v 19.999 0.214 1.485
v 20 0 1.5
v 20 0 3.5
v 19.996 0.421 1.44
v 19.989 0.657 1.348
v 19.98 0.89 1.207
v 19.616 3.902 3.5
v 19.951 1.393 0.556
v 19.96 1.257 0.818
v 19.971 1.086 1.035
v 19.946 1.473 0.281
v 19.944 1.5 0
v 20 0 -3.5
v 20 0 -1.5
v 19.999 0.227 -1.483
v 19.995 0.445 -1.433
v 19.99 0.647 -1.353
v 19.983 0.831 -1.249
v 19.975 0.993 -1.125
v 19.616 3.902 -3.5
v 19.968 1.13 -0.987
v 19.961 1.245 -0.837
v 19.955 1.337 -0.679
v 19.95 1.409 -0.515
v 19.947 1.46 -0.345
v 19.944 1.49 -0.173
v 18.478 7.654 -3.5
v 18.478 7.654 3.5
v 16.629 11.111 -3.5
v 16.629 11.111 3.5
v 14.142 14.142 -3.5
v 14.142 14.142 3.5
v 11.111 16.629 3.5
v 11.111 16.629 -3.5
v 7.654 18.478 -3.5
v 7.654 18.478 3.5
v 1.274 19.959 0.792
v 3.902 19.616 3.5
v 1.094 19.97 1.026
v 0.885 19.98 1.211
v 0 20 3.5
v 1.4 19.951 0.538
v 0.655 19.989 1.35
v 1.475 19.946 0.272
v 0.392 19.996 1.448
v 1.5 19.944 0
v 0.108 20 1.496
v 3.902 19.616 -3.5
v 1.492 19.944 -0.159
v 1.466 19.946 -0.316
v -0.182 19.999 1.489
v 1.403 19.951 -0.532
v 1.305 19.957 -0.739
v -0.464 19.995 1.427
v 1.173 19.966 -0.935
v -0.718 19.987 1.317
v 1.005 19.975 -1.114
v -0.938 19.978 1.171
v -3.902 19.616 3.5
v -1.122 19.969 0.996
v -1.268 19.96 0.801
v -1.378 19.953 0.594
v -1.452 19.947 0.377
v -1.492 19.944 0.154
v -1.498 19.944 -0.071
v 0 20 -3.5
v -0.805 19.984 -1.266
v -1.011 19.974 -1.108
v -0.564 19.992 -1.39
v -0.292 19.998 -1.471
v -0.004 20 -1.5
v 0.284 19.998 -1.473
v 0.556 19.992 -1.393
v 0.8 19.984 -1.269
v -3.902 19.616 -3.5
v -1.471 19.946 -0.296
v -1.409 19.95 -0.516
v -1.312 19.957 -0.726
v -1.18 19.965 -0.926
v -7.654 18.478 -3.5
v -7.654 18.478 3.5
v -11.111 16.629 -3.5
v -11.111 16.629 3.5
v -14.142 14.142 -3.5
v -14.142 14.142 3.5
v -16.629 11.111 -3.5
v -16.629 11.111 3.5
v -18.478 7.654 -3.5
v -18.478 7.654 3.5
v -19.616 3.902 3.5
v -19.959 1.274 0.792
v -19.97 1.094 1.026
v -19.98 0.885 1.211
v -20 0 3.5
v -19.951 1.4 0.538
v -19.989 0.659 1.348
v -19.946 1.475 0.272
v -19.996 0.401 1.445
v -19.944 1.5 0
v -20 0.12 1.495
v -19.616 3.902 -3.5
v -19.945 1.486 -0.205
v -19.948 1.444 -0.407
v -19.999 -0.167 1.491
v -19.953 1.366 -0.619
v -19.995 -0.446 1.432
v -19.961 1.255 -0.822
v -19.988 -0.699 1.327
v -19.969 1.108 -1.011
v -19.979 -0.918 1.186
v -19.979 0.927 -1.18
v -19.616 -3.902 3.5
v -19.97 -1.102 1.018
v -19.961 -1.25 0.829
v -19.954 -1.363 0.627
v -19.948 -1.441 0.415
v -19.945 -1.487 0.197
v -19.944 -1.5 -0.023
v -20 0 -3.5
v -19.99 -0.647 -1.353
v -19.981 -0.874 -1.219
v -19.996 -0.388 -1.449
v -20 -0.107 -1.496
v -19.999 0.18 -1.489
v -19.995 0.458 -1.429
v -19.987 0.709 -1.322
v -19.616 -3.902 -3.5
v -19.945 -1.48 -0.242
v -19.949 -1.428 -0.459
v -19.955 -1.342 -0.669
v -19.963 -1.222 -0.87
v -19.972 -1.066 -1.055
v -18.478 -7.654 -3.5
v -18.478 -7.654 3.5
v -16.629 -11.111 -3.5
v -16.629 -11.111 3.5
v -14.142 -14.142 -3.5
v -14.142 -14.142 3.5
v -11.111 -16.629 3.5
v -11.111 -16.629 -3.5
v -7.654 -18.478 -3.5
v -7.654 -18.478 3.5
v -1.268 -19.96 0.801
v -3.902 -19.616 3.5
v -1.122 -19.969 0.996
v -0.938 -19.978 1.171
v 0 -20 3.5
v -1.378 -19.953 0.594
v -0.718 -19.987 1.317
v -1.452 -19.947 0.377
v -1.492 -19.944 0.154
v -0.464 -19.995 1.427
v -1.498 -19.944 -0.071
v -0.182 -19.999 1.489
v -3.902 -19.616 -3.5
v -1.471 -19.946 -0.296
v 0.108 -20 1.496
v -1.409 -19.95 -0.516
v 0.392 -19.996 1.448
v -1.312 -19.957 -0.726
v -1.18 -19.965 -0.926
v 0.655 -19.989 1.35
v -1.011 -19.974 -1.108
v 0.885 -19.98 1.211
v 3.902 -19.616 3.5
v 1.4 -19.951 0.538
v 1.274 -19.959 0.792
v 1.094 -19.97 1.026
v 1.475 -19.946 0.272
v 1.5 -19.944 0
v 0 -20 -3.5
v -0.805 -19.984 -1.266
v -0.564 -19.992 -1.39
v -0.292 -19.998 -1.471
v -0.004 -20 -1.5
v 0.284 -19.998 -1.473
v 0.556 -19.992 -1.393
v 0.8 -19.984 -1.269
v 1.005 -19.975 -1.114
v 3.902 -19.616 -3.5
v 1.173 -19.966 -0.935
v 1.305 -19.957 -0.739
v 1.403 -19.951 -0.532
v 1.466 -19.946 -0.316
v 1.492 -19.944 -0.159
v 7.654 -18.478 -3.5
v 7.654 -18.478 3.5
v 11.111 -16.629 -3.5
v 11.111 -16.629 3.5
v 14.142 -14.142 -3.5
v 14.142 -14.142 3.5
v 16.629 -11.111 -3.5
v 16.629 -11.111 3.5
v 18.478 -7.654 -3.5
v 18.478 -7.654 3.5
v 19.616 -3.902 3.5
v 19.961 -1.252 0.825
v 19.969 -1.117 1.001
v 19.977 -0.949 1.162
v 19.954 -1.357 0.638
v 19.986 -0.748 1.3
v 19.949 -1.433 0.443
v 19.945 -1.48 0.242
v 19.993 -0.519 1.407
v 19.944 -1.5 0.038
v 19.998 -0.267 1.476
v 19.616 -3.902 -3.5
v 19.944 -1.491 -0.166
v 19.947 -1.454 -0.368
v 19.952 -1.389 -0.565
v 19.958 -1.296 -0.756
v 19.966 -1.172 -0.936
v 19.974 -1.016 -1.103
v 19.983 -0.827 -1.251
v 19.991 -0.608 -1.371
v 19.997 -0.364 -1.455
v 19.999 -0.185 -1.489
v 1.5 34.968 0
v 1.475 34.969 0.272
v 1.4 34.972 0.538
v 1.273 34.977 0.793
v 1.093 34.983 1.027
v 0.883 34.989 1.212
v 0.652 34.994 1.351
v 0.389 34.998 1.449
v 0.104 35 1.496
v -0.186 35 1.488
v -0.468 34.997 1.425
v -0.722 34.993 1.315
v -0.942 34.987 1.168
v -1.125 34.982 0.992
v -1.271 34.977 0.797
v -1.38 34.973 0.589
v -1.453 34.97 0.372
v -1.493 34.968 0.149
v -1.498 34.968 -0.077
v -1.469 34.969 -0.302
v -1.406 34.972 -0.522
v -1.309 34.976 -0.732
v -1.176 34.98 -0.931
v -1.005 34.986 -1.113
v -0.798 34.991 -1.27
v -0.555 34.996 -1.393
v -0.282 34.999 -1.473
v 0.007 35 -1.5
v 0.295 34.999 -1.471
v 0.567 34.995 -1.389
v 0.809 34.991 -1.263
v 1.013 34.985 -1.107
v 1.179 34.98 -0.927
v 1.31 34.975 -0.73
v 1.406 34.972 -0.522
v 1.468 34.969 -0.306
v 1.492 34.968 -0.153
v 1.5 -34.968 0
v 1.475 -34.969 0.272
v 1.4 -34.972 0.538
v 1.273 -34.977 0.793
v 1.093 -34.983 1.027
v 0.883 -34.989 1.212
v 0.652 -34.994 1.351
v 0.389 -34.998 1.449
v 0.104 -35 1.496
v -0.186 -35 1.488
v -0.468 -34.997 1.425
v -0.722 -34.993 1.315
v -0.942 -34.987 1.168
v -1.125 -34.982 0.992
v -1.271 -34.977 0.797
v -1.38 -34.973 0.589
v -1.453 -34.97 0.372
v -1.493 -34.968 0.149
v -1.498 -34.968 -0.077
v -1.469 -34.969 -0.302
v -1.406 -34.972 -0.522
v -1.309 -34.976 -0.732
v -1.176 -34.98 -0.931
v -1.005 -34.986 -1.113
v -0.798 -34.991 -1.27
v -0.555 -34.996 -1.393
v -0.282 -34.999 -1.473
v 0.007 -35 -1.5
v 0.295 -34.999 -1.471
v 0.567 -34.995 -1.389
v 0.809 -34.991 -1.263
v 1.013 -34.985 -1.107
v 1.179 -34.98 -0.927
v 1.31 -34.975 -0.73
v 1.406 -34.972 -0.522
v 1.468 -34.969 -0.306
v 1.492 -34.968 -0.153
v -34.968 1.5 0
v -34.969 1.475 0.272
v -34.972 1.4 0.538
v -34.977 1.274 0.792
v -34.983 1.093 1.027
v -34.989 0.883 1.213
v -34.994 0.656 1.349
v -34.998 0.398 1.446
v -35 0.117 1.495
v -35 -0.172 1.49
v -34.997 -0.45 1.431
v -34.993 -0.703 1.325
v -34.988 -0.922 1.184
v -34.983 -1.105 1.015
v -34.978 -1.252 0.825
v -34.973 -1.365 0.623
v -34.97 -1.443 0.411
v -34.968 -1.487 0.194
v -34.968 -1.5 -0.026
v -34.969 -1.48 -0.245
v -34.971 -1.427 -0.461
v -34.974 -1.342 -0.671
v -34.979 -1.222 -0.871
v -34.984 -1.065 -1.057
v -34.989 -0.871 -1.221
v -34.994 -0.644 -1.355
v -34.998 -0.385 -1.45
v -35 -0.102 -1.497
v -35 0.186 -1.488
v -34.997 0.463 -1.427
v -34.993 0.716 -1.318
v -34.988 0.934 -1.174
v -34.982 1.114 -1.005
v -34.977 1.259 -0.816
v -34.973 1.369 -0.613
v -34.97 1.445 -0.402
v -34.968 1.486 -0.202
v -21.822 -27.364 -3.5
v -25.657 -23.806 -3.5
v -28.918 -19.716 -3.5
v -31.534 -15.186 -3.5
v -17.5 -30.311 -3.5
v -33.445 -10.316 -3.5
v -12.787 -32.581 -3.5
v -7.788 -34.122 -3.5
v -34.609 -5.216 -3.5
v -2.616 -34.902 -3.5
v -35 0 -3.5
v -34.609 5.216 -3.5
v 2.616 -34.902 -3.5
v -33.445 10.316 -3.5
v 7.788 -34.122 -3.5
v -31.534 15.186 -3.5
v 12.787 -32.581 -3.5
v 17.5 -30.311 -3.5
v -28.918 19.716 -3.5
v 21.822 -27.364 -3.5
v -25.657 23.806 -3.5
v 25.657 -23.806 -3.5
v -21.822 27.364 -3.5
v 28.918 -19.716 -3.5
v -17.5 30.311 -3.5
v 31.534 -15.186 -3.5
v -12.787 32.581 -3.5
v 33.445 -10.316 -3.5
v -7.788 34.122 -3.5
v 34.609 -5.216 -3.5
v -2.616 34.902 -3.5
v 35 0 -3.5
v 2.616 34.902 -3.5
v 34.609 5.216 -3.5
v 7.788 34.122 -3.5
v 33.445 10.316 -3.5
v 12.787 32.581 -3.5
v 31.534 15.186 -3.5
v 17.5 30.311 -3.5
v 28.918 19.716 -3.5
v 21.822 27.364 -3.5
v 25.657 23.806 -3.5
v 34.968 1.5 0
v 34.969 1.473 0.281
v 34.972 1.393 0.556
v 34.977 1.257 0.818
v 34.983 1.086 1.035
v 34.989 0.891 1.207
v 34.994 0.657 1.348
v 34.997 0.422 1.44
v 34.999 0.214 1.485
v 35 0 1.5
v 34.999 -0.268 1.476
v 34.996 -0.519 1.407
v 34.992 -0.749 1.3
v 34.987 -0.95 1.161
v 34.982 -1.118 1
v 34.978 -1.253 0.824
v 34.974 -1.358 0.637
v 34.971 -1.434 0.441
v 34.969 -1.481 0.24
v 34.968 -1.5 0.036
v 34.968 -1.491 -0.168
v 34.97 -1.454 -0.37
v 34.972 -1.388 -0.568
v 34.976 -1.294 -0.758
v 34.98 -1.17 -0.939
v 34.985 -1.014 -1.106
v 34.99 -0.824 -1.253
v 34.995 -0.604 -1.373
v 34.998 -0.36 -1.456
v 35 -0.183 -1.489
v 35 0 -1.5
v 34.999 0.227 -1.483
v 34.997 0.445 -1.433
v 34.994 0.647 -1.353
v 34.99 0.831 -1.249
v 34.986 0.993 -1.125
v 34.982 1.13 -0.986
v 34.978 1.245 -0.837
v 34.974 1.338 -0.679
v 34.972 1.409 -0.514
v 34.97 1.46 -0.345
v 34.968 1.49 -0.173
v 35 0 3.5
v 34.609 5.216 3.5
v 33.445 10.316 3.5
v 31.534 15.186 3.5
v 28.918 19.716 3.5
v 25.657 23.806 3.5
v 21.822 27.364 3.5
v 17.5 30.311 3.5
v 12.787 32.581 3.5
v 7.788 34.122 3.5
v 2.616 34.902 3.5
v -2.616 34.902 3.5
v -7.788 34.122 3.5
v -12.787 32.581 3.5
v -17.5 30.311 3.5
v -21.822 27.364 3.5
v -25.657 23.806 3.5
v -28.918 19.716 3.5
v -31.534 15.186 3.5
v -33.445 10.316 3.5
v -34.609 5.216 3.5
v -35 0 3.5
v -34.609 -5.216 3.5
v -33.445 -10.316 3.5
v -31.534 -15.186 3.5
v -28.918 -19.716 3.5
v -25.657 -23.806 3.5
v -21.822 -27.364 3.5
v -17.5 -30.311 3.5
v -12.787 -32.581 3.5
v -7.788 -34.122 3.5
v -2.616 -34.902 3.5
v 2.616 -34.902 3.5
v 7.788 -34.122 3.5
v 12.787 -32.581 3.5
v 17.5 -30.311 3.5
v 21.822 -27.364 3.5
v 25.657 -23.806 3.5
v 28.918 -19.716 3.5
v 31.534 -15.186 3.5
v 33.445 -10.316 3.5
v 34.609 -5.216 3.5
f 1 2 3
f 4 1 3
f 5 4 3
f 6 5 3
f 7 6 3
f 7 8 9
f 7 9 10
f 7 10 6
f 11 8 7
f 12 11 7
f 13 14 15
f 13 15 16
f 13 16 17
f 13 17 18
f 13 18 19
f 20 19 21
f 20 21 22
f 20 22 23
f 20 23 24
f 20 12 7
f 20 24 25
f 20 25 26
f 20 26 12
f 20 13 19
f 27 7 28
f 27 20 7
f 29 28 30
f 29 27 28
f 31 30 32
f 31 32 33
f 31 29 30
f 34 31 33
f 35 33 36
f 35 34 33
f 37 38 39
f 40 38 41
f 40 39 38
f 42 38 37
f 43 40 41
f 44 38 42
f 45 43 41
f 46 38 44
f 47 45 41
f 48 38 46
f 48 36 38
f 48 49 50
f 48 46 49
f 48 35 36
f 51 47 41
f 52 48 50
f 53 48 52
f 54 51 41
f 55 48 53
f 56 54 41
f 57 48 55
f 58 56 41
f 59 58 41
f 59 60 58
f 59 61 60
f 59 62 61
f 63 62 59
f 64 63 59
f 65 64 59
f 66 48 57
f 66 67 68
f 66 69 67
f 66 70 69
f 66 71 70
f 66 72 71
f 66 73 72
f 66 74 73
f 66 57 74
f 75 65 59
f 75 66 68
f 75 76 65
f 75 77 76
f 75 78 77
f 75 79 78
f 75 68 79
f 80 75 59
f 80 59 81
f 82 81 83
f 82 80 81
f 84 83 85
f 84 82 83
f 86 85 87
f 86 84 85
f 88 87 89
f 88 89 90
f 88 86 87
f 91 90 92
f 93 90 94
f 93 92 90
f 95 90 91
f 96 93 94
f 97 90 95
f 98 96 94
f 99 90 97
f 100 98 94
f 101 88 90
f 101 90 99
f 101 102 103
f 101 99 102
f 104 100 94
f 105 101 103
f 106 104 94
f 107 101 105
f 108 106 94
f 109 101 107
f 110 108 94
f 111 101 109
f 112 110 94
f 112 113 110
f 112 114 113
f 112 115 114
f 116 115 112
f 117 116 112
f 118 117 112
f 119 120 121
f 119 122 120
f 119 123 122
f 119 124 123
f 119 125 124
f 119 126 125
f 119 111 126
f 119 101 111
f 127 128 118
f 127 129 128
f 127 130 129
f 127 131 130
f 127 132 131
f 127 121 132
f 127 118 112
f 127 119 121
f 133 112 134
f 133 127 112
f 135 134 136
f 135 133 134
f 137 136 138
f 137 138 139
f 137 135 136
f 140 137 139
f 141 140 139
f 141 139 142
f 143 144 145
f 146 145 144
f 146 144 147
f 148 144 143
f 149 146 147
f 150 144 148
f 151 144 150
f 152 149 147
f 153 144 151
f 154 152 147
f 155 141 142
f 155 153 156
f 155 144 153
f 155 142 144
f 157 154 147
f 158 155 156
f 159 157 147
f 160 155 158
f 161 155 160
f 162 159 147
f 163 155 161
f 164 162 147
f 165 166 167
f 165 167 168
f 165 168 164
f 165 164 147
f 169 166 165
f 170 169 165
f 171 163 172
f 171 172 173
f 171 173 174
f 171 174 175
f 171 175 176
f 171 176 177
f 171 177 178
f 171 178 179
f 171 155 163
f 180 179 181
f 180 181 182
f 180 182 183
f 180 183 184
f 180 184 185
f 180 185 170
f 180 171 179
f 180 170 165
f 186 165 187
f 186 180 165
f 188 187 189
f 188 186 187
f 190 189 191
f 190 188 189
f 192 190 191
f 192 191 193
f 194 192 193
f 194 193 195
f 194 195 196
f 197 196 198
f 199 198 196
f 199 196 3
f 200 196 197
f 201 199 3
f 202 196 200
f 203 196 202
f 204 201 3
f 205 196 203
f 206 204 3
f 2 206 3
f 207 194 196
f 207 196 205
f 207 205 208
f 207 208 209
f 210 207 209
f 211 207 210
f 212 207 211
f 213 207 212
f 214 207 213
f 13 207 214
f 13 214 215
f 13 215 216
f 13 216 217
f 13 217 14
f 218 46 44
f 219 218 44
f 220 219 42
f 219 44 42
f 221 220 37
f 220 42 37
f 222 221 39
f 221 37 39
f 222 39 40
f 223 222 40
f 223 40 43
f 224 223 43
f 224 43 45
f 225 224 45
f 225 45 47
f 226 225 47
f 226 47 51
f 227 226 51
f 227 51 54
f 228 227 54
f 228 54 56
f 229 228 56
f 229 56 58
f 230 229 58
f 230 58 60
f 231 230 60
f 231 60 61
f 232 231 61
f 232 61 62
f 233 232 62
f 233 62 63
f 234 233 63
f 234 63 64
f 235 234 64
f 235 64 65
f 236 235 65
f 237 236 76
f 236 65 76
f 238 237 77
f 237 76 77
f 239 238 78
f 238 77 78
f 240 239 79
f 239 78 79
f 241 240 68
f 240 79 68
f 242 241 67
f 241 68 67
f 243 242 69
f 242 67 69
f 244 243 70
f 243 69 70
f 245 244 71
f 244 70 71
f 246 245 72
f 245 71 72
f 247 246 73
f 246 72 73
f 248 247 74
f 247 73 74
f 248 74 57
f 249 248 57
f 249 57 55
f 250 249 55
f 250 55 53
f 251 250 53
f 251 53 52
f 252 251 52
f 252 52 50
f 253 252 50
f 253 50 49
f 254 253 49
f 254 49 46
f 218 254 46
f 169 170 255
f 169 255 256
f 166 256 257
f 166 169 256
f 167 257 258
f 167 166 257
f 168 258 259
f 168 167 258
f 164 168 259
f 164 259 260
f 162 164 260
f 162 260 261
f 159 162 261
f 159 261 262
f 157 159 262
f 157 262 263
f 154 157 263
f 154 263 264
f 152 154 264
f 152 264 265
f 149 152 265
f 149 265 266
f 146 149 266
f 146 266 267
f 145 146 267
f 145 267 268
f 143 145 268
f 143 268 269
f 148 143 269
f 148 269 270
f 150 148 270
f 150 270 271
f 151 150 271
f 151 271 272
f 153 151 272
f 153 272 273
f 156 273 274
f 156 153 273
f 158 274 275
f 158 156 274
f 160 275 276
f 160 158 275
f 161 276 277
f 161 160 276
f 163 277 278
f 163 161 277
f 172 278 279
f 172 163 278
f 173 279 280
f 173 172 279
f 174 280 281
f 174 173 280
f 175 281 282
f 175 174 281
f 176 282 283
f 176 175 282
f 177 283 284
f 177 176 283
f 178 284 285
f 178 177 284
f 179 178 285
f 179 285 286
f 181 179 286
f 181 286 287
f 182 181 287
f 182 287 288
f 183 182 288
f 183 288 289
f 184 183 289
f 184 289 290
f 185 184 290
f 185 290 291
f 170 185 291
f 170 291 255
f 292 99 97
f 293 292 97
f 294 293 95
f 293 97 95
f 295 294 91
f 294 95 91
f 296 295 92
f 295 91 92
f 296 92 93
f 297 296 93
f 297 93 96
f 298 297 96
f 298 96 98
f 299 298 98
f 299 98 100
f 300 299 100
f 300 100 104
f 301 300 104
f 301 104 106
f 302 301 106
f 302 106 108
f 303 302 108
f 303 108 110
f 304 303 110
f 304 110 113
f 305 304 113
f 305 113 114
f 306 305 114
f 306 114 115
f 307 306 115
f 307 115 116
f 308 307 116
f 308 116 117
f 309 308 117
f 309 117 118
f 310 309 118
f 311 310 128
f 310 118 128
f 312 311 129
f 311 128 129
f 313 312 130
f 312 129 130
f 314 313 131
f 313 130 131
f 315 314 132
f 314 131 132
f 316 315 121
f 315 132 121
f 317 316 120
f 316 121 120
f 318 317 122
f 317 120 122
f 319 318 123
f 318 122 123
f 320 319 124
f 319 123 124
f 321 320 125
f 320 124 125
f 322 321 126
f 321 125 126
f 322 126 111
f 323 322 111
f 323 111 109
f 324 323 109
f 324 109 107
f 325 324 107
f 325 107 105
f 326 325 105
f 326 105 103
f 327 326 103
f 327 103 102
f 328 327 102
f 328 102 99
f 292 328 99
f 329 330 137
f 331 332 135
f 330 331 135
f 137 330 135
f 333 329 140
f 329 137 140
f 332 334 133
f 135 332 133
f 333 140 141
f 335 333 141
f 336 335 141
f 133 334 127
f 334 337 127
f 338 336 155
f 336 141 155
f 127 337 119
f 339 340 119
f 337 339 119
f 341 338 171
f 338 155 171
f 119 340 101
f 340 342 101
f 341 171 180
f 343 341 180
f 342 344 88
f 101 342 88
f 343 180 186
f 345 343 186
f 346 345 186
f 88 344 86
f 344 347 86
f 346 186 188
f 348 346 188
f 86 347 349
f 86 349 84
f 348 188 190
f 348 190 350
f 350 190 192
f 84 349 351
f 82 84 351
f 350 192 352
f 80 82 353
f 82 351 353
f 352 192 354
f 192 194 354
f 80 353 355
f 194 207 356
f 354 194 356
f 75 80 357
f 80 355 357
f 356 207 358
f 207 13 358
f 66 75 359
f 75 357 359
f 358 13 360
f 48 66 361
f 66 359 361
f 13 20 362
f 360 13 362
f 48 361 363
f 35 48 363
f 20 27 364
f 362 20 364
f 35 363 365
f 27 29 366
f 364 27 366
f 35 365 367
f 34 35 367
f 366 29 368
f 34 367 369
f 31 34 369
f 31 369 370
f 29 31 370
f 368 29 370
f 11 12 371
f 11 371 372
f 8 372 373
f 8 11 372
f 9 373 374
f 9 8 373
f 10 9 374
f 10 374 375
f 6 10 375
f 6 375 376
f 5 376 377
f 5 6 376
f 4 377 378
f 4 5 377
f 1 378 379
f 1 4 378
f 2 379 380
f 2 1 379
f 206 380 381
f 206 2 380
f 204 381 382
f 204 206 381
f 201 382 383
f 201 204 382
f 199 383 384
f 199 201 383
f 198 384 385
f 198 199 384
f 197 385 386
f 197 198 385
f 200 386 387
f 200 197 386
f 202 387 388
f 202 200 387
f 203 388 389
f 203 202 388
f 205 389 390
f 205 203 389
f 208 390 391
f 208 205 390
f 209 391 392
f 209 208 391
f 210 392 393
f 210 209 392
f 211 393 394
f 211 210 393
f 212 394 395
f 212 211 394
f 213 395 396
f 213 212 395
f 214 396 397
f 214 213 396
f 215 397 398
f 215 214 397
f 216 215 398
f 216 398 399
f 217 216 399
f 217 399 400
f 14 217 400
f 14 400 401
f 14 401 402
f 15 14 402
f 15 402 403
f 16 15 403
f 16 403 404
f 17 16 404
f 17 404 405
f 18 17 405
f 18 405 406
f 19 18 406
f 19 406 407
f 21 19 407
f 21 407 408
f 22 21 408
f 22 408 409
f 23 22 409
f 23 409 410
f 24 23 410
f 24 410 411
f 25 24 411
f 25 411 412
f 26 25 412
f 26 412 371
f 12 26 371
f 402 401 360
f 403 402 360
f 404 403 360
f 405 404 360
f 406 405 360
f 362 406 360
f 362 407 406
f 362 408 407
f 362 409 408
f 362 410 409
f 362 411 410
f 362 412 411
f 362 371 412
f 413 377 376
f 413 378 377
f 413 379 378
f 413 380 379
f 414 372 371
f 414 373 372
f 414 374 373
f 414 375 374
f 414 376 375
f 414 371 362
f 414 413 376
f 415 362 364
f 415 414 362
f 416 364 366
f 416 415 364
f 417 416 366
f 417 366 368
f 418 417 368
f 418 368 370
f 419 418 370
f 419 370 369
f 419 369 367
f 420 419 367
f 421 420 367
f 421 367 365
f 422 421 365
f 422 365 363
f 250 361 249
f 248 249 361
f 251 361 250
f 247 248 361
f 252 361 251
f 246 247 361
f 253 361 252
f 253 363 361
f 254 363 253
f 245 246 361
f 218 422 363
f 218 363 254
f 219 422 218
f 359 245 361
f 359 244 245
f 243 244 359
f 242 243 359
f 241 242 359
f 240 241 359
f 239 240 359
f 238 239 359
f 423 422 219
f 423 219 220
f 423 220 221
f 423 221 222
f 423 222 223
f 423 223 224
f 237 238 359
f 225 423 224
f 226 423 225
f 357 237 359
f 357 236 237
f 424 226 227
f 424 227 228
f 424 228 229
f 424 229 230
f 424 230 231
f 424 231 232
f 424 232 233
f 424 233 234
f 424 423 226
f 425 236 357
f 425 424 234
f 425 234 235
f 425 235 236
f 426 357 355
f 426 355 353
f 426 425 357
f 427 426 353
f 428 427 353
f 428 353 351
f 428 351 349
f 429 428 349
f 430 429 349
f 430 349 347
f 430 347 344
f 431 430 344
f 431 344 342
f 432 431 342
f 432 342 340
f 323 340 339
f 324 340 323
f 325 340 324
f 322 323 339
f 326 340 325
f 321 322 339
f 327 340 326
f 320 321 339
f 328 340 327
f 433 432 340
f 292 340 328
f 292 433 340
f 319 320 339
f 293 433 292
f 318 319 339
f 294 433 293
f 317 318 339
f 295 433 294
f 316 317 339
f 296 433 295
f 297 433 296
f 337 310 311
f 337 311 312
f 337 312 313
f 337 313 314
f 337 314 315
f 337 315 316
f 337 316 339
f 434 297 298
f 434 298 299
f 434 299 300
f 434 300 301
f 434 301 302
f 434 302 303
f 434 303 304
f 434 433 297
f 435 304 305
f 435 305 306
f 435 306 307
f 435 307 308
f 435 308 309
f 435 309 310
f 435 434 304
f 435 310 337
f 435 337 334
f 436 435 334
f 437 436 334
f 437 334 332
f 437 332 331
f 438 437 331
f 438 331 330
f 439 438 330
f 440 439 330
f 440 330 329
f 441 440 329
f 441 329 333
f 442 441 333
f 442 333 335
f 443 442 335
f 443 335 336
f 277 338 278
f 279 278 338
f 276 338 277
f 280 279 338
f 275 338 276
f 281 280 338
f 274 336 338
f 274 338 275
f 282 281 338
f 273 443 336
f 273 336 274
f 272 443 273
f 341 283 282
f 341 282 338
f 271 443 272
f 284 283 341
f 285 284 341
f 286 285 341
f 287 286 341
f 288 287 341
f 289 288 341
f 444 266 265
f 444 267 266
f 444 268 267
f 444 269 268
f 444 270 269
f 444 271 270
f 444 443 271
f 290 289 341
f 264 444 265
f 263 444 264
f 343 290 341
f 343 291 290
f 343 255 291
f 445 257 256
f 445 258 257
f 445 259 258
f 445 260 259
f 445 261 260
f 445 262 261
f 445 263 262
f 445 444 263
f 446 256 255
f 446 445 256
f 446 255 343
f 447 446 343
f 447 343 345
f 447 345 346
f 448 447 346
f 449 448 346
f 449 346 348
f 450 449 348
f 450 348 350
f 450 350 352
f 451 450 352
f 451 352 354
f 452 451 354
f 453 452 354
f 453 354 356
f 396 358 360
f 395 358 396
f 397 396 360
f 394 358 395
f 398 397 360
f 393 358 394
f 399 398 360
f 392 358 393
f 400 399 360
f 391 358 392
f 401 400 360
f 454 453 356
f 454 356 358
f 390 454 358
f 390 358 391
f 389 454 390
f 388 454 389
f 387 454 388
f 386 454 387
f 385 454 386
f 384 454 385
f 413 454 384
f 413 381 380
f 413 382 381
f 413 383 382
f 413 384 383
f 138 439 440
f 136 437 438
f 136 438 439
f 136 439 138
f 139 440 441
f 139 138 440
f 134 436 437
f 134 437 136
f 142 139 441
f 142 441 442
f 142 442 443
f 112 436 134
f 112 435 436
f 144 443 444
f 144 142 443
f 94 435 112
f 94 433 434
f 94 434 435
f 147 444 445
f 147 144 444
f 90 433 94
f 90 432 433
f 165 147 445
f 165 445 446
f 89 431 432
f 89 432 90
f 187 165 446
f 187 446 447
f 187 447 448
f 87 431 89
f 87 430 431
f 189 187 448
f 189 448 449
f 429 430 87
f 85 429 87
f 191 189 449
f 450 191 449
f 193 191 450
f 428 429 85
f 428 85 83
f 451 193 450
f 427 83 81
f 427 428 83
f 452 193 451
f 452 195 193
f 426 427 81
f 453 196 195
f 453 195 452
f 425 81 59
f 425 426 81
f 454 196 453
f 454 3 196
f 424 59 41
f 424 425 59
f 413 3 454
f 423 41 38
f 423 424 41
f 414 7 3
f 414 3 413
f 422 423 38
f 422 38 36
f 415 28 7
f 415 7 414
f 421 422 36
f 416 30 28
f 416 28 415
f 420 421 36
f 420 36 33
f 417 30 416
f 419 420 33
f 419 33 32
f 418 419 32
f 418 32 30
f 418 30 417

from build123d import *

# Parameters (mm, degrees)
F0_R          = 35
F0_R_2        = 20
F1_DEPTH      = 3.5
F2_R          = 1.5
F4_DEPTH      = 35.001
F4_DEPTH_BACK = 35.001
F3_R          = 1.5
F5_DEPTH      = 35.0010001
F5_DEPTH_BACK = 35.0010001


with BuildPart() as f1:
    # F0 (on Top) → F1 (new body, symmetric)
    with BuildSketch(Plane.XY):
        Circle(F0_R)
        Circle(F0_R_2, mode=Mode.SUBTRACT)
    extrude(amount=F1_DEPTH, both=True)

    # F2 (on Right) → F4 (cut, two sides)
    with BuildSketch(Plane.YZ) as f4_sk:
        Circle(F2_R)
    extrude(amount=-F4_DEPTH, mode=Mode.SUBTRACT)
    extrude(f4_sk.sketch, amount=F4_DEPTH_BACK, mode=Mode.SUBTRACT)

    # F3 (on Front) → F5 (cut, two sides)
    with BuildSketch(Plane.XZ) as f5_sk:
        Circle(F3_R)
    extrude(amount=-F5_DEPTH, mode=Mode.SUBTRACT)
    extrude(f5_sk.sketch, amount=F5_DEPTH_BACK, mode=Mode.SUBTRACT)


solid = f1.part
